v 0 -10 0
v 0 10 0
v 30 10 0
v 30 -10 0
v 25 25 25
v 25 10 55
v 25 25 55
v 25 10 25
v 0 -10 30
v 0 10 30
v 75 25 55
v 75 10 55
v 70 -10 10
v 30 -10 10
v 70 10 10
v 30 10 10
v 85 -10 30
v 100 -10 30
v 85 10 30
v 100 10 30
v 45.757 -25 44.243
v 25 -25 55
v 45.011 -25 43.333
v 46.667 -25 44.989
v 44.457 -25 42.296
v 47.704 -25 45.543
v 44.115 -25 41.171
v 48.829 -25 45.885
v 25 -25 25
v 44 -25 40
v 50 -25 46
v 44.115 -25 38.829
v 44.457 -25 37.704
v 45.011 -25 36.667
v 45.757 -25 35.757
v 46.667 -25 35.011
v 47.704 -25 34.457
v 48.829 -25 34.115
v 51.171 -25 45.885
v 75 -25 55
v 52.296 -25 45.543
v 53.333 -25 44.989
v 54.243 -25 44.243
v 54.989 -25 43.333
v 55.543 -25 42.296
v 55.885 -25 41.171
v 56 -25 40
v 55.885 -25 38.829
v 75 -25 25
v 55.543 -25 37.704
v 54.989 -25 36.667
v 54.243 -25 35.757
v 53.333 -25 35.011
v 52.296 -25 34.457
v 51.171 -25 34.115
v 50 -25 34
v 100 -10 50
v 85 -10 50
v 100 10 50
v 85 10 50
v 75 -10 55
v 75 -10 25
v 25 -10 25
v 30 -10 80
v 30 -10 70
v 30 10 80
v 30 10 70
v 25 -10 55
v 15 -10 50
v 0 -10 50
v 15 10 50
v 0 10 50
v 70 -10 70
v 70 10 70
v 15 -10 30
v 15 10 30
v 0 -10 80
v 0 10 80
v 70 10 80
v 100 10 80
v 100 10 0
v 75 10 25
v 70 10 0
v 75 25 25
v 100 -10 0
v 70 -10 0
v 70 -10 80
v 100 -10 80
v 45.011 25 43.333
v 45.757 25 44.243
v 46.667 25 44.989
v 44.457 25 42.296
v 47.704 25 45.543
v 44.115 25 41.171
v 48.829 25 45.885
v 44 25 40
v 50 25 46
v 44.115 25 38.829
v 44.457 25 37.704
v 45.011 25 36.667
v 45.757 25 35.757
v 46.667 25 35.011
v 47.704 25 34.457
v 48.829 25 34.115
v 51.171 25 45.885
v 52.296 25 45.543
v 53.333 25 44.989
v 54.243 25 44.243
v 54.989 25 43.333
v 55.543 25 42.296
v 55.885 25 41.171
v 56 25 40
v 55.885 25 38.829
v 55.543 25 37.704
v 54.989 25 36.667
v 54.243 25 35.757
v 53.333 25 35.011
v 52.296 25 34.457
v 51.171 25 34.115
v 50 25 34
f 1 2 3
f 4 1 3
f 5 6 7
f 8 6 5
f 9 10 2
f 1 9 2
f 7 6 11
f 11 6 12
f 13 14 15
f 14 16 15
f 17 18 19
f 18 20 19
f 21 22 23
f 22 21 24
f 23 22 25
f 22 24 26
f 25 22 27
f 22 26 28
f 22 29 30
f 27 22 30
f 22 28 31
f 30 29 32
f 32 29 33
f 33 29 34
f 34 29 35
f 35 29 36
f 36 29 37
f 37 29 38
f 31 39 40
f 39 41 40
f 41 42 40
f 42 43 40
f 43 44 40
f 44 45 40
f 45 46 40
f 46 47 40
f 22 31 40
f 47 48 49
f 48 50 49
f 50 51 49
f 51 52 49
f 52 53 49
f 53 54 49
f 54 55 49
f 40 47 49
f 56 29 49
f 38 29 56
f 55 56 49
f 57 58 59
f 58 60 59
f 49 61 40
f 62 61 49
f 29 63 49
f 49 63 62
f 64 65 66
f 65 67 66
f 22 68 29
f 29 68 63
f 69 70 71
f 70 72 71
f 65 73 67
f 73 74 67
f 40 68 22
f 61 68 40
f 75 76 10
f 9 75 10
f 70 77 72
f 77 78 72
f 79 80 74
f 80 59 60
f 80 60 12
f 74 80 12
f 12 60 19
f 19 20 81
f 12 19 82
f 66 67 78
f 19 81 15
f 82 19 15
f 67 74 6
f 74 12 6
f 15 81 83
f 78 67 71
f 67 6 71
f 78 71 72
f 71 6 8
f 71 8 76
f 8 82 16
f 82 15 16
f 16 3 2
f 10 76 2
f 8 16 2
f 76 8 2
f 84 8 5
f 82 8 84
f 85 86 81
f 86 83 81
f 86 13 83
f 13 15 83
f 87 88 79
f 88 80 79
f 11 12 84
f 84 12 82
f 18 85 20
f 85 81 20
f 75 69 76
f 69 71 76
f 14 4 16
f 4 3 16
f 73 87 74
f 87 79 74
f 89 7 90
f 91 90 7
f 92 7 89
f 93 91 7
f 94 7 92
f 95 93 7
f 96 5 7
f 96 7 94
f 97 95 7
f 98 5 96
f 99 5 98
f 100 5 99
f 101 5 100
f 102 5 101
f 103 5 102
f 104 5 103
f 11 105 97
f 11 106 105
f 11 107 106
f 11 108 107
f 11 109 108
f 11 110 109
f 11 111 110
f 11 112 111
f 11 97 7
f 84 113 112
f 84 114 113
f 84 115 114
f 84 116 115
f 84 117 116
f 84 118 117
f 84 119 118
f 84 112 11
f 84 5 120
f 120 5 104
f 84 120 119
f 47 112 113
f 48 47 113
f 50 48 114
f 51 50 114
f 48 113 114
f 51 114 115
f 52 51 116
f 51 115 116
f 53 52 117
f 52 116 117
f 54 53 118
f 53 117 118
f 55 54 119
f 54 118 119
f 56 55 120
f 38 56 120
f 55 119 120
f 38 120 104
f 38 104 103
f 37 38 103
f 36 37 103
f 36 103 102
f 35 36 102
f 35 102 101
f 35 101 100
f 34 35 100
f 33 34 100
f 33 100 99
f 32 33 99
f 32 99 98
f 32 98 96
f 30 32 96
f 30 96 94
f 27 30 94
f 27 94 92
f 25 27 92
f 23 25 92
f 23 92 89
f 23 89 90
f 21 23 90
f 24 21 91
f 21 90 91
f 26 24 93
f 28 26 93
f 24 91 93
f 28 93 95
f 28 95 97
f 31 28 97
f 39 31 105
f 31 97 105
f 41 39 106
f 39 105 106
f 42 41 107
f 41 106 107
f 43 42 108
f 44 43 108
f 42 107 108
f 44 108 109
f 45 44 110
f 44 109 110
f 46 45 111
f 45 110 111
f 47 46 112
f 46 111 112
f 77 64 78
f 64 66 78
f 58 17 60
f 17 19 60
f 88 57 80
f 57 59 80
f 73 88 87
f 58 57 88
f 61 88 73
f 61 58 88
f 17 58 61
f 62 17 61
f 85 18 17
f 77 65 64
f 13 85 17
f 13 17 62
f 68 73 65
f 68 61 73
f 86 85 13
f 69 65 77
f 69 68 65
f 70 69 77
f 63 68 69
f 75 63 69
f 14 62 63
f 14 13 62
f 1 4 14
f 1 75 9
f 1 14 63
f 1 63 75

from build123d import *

# Parameters (mm, degrees)
BOSS_EXTRUDE1_DEPTH      = 10
BOSS_EXTRUDE1_DEPTH_BACK = 10
BOSS_EXTRUDE2_DEPTH      = 25
BOSS_EXTRUDE2_DEPTH_BACK = 25
SKETCH2_W                = 50
SKETCH2_H                = 30
SKETCH3_R                = 6
CUT_EXTRUDE1_DEPTH       = 138.477270849


with BuildPart() as part:
    # Sketch1 → Boss-Extrude1 (new, two sides: drawn at the far end of the back side and taken through both)
    with BuildSketch(Plane(origin=(0, 0, 0), x_dir=(1, 0, 0), z_dir=(0, 1, 0)).offset(-BOSS_EXTRUDE1_DEPTH_BACK)):
        Polygon((0, 0), (30, 0), (30, -10), (70, -10), (70, 0), (100, 0), (100, -30), (85, -30), (85, -50), (100, -50), (100, -80), (70, -80), (70, -70), (30, -70), (30, -80), (0, -80), (0, -50), (15, -50), (15, -30), (0, -30), align=None)
    extrude(amount=BOSS_EXTRUDE1_DEPTH + BOSS_EXTRUDE1_DEPTH_BACK)

    # Sketch2 → Boss-Extrude2 (add, two sides: drawn at the far end of the back side and taken through both)
    with BuildSketch(Plane(origin=(0, 0, 0), x_dir=(1, 0, 0), z_dir=(0, 1, 0)).offset(-BOSS_EXTRUDE2_DEPTH_BACK)):
        with Locations((50, -40)):
            Rectangle(SKETCH2_W, SKETCH2_H)
    extrude(amount=BOSS_EXTRUDE2_DEPTH + BOSS_EXTRUDE2_DEPTH_BACK)

    # Sketch3 → Cut-Extrude1 (cut, through all)
    with BuildSketch(Plane(origin=(0, 25, 0), x_dir=(1, 0, 0), z_dir=(0, 1, 0))):
        with Locations((50, -40)):
            Circle(SKETCH3_R)
    extrude(amount=-CUT_EXTRUDE1_DEPTH, mode=Mode.SUBTRACT)


solid = part.part
